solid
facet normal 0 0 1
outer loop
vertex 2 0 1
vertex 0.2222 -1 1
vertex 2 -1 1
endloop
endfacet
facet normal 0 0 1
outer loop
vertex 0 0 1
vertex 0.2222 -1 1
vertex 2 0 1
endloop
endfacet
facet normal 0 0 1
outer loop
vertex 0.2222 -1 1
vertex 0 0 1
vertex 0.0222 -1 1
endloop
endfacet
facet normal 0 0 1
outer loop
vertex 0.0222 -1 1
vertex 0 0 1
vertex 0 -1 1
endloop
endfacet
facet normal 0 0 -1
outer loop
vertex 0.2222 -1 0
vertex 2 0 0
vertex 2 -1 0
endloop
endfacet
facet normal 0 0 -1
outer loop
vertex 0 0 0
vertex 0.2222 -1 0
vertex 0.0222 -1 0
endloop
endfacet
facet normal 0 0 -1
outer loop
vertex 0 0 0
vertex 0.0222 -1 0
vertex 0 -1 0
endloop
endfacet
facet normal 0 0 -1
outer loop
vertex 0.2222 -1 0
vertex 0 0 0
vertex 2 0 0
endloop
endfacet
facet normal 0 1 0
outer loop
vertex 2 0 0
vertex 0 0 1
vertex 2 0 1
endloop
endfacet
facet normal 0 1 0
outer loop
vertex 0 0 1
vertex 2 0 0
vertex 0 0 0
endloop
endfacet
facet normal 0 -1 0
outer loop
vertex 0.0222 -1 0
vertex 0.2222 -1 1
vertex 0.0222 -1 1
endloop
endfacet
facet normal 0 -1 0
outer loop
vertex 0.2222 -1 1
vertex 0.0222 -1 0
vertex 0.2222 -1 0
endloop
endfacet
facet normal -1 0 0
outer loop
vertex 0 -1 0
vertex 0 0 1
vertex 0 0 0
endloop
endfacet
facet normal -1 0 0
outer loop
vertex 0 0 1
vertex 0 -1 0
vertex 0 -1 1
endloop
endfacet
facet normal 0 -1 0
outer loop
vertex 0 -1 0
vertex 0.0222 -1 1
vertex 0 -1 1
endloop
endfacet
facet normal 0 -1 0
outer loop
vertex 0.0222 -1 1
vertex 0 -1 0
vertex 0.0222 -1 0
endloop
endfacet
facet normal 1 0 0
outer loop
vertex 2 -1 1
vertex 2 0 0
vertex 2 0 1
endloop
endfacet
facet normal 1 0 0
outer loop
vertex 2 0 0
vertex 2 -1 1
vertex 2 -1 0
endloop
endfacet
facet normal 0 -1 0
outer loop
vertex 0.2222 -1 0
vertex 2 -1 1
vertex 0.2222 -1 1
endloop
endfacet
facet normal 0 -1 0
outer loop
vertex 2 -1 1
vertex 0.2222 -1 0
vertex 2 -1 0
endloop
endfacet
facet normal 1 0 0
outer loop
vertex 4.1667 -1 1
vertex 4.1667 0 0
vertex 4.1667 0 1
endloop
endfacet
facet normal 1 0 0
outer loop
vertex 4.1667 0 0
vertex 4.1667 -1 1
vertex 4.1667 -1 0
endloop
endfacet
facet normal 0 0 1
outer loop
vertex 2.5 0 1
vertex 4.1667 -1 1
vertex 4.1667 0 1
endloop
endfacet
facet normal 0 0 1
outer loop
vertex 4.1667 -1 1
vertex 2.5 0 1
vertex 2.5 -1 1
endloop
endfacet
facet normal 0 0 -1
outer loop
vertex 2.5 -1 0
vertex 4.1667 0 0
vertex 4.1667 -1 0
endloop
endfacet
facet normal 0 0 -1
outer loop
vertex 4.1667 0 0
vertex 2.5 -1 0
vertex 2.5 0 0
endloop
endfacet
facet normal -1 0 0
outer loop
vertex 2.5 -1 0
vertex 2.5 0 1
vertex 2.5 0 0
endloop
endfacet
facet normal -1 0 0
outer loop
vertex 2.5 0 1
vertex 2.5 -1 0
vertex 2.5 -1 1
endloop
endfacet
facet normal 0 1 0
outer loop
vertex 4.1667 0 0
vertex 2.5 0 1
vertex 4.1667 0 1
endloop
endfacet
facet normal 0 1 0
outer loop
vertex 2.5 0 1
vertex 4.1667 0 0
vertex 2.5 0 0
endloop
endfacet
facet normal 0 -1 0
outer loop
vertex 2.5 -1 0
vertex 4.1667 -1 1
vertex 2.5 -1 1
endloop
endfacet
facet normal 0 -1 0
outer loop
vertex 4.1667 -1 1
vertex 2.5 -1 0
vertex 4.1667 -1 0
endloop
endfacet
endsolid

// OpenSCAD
// file: belarusFlagPattern.scad
function belarusFlagPattern() = [
    "    XXX    X    XXX    ",
    "X  XXXXX   X   XXXXX  X",
    "  XXX XXX     XXX XXX  ",
    " XXX   XXX   XXX   XXX ",
    "XXX  X  XXX XXX  X  XXX",
    " XXX   XXX   XXX   XXX ",
    "  XXX XXX     XXX XXX  ",
    "X  XXXXX   X   XXXXX  X",
    "    XXX    X    XXX    ",
    "  X  X  X     X  X  X  ",
    " XXX   XXX   XXX   XXX ",
    "XX XX XX XX XX XX XX XX",
    " XXX   XXX   XXX   XXX ",
    "  X  X  X     X  X  X  ",
    "    XXX    X    XXX    ",
    "X  XXXXX   X   XXXXX  X",
    "  XXXXXXX     XXXXXXX  ",
    " XXXXXXXXX   XXXXXXXXX ",
    "XXXXXXXXXXX XXXXXXXXXXX",
    "XXXX   XXXXXXXXX   XXXX",
    " XXXXX  XXXXXXX  XXXXX ",
    "  XXX    XXXXX    XXX  ",
    "X  X    XXXXXXX    X  X",
    "       XXXX XXXX       ",
    "X     XXXX   XXXX     X",
    "XX   XXXX  X  XXXX   XX",
    "XXX XXXX       XXXX XXX",
    " XXXXXX  X   X  XXXXXX ",
    "  XXXX   XX XX   XXXX  ",
    "   XXX    XXX    XXX   ",
    "    XX X   X   X XX    ",
    "   XXX    XXX    XXX   ",
    "  XXXX   XX XX   XXXX  ",
    " XXXXXX  X   X  XXXXXX ",
    "XXX XXXX       XXXX XXX",
    "XX   XXXX  X  XXXX   XX",
    "X     XXXX   XXXX     X",
    "       XXXX XXXX       ",
    "X  X    XXXXXXX    X  X",
    "  XXX    XXXXX    XXX  ",
    " XXXXX  XXXXXXX  XXXXX ",
    "XXXX   XXXXXXXXX   XXXX",
    "XXXXXXXXXXX XXXXXXXXXXX",
    " XXXXXXXXX   XXXXXXXXX ",
    "  XXXXXXX     XXXXXXX  ",
    "X  XXXXX   X   XXXXX  X",
    "    XXX    X    XXX    ",
    "  X  X  X     X  X  X  ",
    " XXX   XXX   XXX   XXX ",
    "XX XX XX XX XX XX XX XX",
    " XXX   XXX   XXX   XXX ",
    "  X  X  X     X  X  X  ",
    "    XXX    X    XXX    ",
    "X  XXXXX   X   XXXXX  X",
    "  XXX XXX     XXX XXX  ",
    " XXX   XXX   XXX   XXX ",
    "XXX  X  XXX XXX  X  XXX",
    " XXX   XXX   XXX   XXX ",
    "  XXX XXX     XXX XXX  ",
    "X  XXXXX   X   XXXXX  X",
    "    XXX    X    XXX    ",
];
// main file
use <belarusFlagPattern.scad>

BelarusFlag();
translate([2.5, 0, 0]) GermanFlag();

module BelarusFlag() {
    pattern = belarusFlagPattern();

    colorRed = [1, 0, 0];
    colorGreen = [0, 153/255, 0];
    colorWhite = [1, 1, 1];

    barWidth = 1;
    patternWidth = 9;
    bigWidth = 80;

    redHeight = 30;
    greenHeight = 15;

    totalHeight = redHeight + greenHeight;
    thickness = 1;

    scale([1/totalHeight, 1/totalHeight, 1]) {
        translate([0, -totalHeight, 0])
            color(colorRed) cube([barWidth, totalHeight, thickness]);
        translate([barWidth+patternWidth, -redHeight, 0])
            color(colorRed) cube([bigWidth, redHeight, thickness]);
        translate([barWidth+patternWidth, -totalHeight, 0])
            color(colorGreen) cube([bigWidth, greenHeight, thickness]);

        translate([barWidth, 0, 0]) scale([patternWidth/23, totalHeight/61, thickness])
            for (x = [0 : 1 : len(pattern[0])-1]) {
                column = [ for (y = [0 : 1 : len(pattern)-1]) pattern[y][x] ];
                rectangles = rle(column);
                for (index = [0 : 1 : len(rectangles)-1]) {
                    previousHeights = [for (i = [0 : 1 : index-1]) rectangles[i][1]];
                    y = sum(previousHeights);
                    symbol = rectangles[index][0];
                    height = rectangles[index][1];
                    color(symbol != " " ? colorRed : colorWhite)
                        translate([x, -y-height, 0])
                            cube([1, height, 1]);
                }
            }
    }
}

function head(input) = input[0];

function tail(input) = [ for (i = [1 : 1 : len(input)-1]) input[i] ];

function sum(input, result) =
    let (lresult = result == undef ? 0 : result)
    input == [] ? lresult : sum(tail(input), lresult+head(input));

function rle(input, lastSymbol, lastCount, result) =
    input == [] ? (
        result == undef ?
            [] :
            concat(result, [[lastSymbol, lastCount]])
    ) : (
        let (currentSymbol = head(input))
        let (isSame = currentSymbol == lastSymbol)
        isSame ?
            rle(tail(input), currentSymbol, lastCount + 1, result) :
            rle(tail(input), currentSymbol, 1, lastSymbol == undef ? [] : concat(result, [[lastSymbol, lastCount]]))
    );

module GermanFlag() {
    colorBlack = [0, 0, 0];
    colorRed = [1, 0, 0];
    colorGold = [1, 204/255, 0];

    scale([1/3, 1/3, 1]) {
        translate([0, -1, 0])
            color(colorBlack) cube([5, 1, 1]);
        translate([0, -2, 0])
            color(colorRed) cube([5, 1, 1]);
        translate([0, -3, 0])
            color(colorGold) cube([5, 1, 1]);
    }
}
